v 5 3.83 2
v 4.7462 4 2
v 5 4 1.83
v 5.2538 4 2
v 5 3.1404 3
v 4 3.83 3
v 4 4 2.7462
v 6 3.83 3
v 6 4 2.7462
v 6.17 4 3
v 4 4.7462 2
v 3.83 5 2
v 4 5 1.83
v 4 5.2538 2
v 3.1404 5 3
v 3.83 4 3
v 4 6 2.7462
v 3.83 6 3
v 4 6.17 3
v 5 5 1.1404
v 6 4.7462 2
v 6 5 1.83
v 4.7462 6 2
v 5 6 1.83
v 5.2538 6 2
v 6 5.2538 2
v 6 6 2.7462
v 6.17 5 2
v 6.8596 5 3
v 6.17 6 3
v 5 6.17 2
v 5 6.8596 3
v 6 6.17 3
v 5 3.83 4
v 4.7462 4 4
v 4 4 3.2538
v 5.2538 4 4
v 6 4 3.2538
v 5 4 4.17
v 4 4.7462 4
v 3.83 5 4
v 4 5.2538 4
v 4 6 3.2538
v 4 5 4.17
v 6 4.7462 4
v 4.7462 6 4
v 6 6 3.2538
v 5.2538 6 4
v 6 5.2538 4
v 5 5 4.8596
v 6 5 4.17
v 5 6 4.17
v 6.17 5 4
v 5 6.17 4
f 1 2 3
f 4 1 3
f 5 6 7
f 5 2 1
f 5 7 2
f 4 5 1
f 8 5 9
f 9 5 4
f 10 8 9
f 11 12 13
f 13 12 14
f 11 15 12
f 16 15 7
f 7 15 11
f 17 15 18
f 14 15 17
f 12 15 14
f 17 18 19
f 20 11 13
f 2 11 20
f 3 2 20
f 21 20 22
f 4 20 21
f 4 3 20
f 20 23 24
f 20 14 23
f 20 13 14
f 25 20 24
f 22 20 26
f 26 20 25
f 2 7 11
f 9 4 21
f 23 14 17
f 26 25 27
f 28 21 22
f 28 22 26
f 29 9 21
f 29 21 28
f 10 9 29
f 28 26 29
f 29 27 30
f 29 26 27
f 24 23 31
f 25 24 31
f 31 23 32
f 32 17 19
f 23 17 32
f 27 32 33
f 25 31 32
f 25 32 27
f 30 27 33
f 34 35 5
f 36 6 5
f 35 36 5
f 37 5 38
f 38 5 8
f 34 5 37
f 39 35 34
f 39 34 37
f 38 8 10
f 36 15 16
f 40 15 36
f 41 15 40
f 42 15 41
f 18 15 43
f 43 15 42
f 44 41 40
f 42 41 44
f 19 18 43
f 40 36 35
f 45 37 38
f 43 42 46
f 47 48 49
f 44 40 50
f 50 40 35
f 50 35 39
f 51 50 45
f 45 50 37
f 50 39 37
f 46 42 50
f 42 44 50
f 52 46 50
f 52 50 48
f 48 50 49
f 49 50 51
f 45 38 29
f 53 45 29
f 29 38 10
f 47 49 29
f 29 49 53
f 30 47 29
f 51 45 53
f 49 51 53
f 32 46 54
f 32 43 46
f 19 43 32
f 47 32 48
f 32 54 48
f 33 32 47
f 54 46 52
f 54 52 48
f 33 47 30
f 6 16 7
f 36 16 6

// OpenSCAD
/*
TerrainTile.scad
Public Domain Code
Based on Metaballs By: William A Adams 	4 June 2011

This code is a simplified implementation of "Marching Cubes" over Noise + a Z gradient. A isosurface which is the interaction of the Noise field in tree octaves: half, one and four. All Cubes are tested and a joint hull is generated of each corner that lies inside the threshold  of the metaball 

*/

randseed=3798753;
Resolution =1; 
tileX=0;
tileY=0;
MinSubdivisions=3;//[0:1:5] 
Threshold = 0.0;// [0:0.01:1]
// Allways clamped to powers of two of resolution 
tilesize=16;//[1:1:64] 
// Small Medium Large
octavebalance=[40,150,280];
Zcutoff=5;
Zfalloff=0.1909;// [0:0.001:1]
Zoffset=3;
Diagnostic=false; 
colorseed=rands(0, 49709639, 1)[0]; 
DrawMetaballs( Threshold,tileX*f2(tilesize),tileY*f2(tilesize),-1,tilesize); 

/// end


module DrawMetaballs( Threshold,sx,sy,sz,sSize){
// clamp everyting to multiples and powers of resolution
x=f(sx);
y=f(sy);
    z=f(sz);
    Size=f2(sSize);
   // echo ( Threshold,x,y,z,Size);
DrawSubMetaballs( Threshold,x,y,z,Size); 
}
module DrawSubMetaballs( Threshold,x,y,z,Size,i=0) {    



suma = torus([-5,-5,-3]+[x,y,z],5,3) ; //Octavenoice (x, y, z);
sumb = torus([-5,-5,-3]+[x+ Size,y,z],5,3) ; //Octavenoice (x + Size, y, z );
sumc = torus([-5,-5,-3]+[x,y+ Size,z],5,3) ; //Octavenoice (x, y + Size, z);
sumd = torus([-5,-5,-3]+[x+ Size,y+ Size,z],5,3) ; //Octavenoice (x + Size, y + Size, z);

sume = torus([-5,-5,-3]+[x,y,z+ Size],5,3) ; //Octavenoice (x, y, z + Size);
sumf = torus([-5,-5,-3]+[x+ Size,y ,z+ Size], 5,3) ; //Octavenoice (x + Size, y, z + Size);
sumg = torus([-5,-5,-3]+[x,y+ Size,z+ Size], 5,3) ; //Octavenoice (x, y + Size, z + Size);
sumh = torus([-5,-5,-3]+[x+ Size,y+ Size,z+ Size], 5,3) ; //Octavenoice (x + Size, y + Size, z + Size);
sumcolor =[0.1,1,0]*0.3+0.7*[1-abs(Sweetnoise (x/5, y/5, z/5,colorseed+27)),1-abs(Sweetnoise (x/5, y/5, z/5,colorseed+13)),1-abs(Sweetnoise (x/5, y/5, z/5,colorseed))];

echo (suma);


// test for empty and full Cubes
 if (i<=MinSubdivisions&&z) { 
    h=Size*0.5  ;
    DrawSubMetaballs( Threshold,x,y,z,h,i+1);
    DrawSubMetaballs( Threshold,x+h,y,z,h,i+1);
    DrawSubMetaballs( Threshold,x,y+h,z,h,i+1);
    DrawSubMetaballs( Threshold,x+h,y+h,z,h,i+1);
    
    DrawSubMetaballs( Threshold,x,y,z+h,h,i+1);
    DrawSubMetaballs( Threshold,x+h,y,z+h,h,i+1);
    DrawSubMetaballs( Threshold,x,y+h,z+h,h,i+1);
    DrawSubMetaballs( Threshold,x+h,y+h,z+h,h,i+1);
    
    }else {
    
if (  suma >=  Threshold && sumb >=  Threshold && sumc >=  Threshold && sumd >=  Threshold && sume >=  Threshold && sumf >=  Threshold && sumg >=  Threshold && sumh >=  Threshold) {if (Diagnostic){translate([x, y, z]) %cube(Size);}} 
else if ( suma < Threshold && sumb < Threshold && sumc < Threshold && sumd < Threshold && sume < Threshold && sumf < Threshold && sumg < Threshold && sumh < Threshold) {
translate([x, y, z])  color(sumcolor) cube(Size);} 


else if(Size>Resolution){ 
    h=Size*0.5  ;
    DrawSubMetaballs( Threshold,x,y,z,h,i+1);
    DrawSubMetaballs( Threshold,x+h,y,z,h,i+1);
    DrawSubMetaballs( Threshold,x,y+h,z,h,i+1);
    DrawSubMetaballs( Threshold,x+h,y+h,z,h,i+1);
    
    DrawSubMetaballs( Threshold,x,y,z+h,h,i+1);
    DrawSubMetaballs( Threshold,x+h,y,z+h,h,i+1);
    DrawSubMetaballs( Threshold,x,y+h,z+h,h,i+1);
    DrawSubMetaballs( Threshold,x+h,y+h,z+h,h,i+1);}
else { 

    // For every corner inside treshold make and mirror a corner piece, hull the lot.
   //echo(sumcolor);
    color(sumcolor)hull(){
        
        sab=inter(suma,sumb,Threshold)*Size;
sac=inter(suma,sumc,Threshold)*Size;
sae=inter(suma,sume,Threshold)*Size;
sba=inter(sumb,suma,Threshold)*Size;
sbd=inter(sumb,sumd,Threshold)*Size;
sbf=inter(sumb,sumf,Threshold)*Size;
sca=inter(sumc,suma,Threshold)*Size;
scd=inter(sumc,sumd,Threshold)*Size;
scg=inter(sumc,sumg,Threshold)*Size;
sdb=inter(sumd,sumb,Threshold)*Size;
sdc=inter(sumd,sumc,Threshold)*Size;
sdh=inter(sumd,sumh,Threshold)*Size;
sea=inter(sume,suma,Threshold)*Size;
seg=inter(sume,sumg,Threshold)*Size;
sef=inter(sume,sumf,Threshold)*Size;
sfh=inter(sumf,sumh,Threshold)*Size;
sfe=inter(sumf,sume,Threshold)*Size;
sfb=inter(sumf,sumb,Threshold)*Size;
sge=inter(sumg,sume,Threshold)*Size;
sgh=inter(sumg,sumh,Threshold)*Size;
sgc=inter(sumg,sumc,Threshold)*Size;
shg=inter(sumh,sumg,Threshold)*Size;
shf=inter(sumh,sumf,Threshold)*Size;
shd=inter(sumh,sumd,Threshold)*Size;
if (suma < Threshold){    translate([x, y, z])  Corner(sab,sac,sae);}
if (sumb < Threshold){    translate([x + Size, y, z])  Corner(-sba,sbd,sbf);}
if (sumc < Threshold){  translate([x, y + Size, z])  Corner(scd,-sca,scg);}
if (sumd < Threshold){    translate([x + Size, y + Size, z]) Corner(-sdc,-sdb,sdh);}
    
if (sume < Threshold){   translate([x, y, z + Size])  Corner(sef,seg,-sea);}
if (sumf < Threshold){   translate([x + Size, y, z + Size])  Corner(-sfe,sfh,-sfb);}
if (sumg < Threshold){    translate([x, y + Size, z + Size])  Corner(sgh,-sge,-sgc);}
if (sumh < Threshold){    translate([x + Size, y + Size, z + Size]) Corner(-shg,-shf,-shd);}
}
    }
}}


//Corner piece
module Corner(u=0.5,v=0.5,w=0.5) {scale([u,v,w])
polyhedron
    (points = [	       [0,0,0],[1,0,0],[0,1,0],[0,0,1],],      faces = [		  [0,0,1],[0,0,2],[0,0,3],[1,2,3]
		  ]
     );}
     
     function lim31(l, v) = v / len3(v) * l;
function addl(l, c = 0) = c < len(l) - 1 ? l[c] + addl(l, c + 1) : l[
 c];
function len3(v) = len(v) > 1 ? sqrt(addl([
 for (i = [0: len(v) - 1]) pow(v[i], 2)
])) : len(v) == 1 ? v[0] : v;
// Random color

function Lotto(i) = [rands(i*30,i*30+ 30, 1)[0],rands(0, 65, 1)[0],rands(0, 75, 1)[0],rands(21, 24, 1)[0]];

//Field function
     function ColorField3D(x, y, z, BallSack,Colorsack, i) = (i == 0) ? Powercolor(x, y, z, BallSack[0])*Colorsack[0]: Powercolor(x, y, z, BallSack[i])*Colorsack[i] + ColorField3D(x, y, z, BallSack,Colorsack, i - 1);

function Powercolor(x, y, z, Ball) = (Ball[3] / sqrt((x - Ball[0]) * (x - Ball[0]) + (y - Ball[1]) * (y - Ball[1]) + (z - Ball[2]) * (z - Ball[2]))); 
     
//function Powerball(x, y, z, Ball) = (Ball[3] / sqrt((x - Ball[0]) * (x - Ball[0]) + (y - Ball[1]) * (y - Ball[1]) + (z - Ball[2]) * (z - Ball[2])));
 function Powerball(x, y, z, Ball)   = Coldnoise (x,y,z);
// Recursive Field Evaluation
function BallField3D(x, y, z, BallSack, i) = (i == 0) ? Powerball(x, y, z, BallSack[0]): Powerball(x, y, z, BallSack[i]) + BallField3D(x, y, z, BallSack, i - 1);
function rndc() = [round(rands(0, 2, 1)[0])/2, round(rands(0, 2, 1)[0])/2, round(rands(0, 2, 1)[0])/2];
     //interpolate
function inter(t,r,Threshold)=(t==r)?1:(t>Threshold)?(r<Threshold)? abs(Threshold-t)/abs(t-r) :0 :(r>Threshold)? abs(Threshold-t)/abs(t-r) :1 ;
// Recursive find min/max extremes
function findMax(v, select, i = 0) = ((i + 1) < len(v)) ? max(v[i][select] + abs(v[i][3]) + Resolution, findMax(v, select, i + 1)): v[i][select] + abs(v[i][3]) + Resolution;
function findMin(v, select, i = 0) = ((i + 1) < len(v)) ? min(v[i][select] - abs(v[i][3]) - Resolution, findMin(v, select, i + 1)): v[i][select] - abs(v[i][3]) - Resolution;
function Coldnoise (x,y,z,seed=69940 )= 
((3754853343/((abs((floor(x+40)) ))+1))%1
+(3628273133/((abs((floor(y+44) ) ))+1) )%1
+(3500450271/((abs((floor(z+46 )) ))+1) )%1
+(3367900313/(abs(seed)+1) )/1)%1 ;

function Sweetnoise (x,y,z,seed=69840)=(z-Zoffset)*Zfalloff+tril( SC3(x-floor(x)), (SC3(y-floor(y))), (SC3(z-floor(z))),
    Coldnoise ((x ) ,(y ) ,(z ) ,seed),
    Coldnoise ((x+1  ),(y ) ,(z ) ,seed),
    Coldnoise ((x ) ,(y+1 ) ,(z ) ,seed),
    Coldnoise ((x ) ,(y ) ,(z+1) ,seed),
    Coldnoise ((x  +1),(y ) ,(z+1 ) ,seed),
    Coldnoise ((x ) ,(y+1 ) ,(z+1 ) ,seed),
    Coldnoise ((x+1 ),(y+1) ,(z ) ,seed),
    Coldnoise ((x +1) ,(y+1),(z+1 ) ,seed));
    
   function SC3 (a)= (a * a * (3 - 2 * a))
   ;
function tril(x,y,z,V000,V100,V010,V001,V101,V011,V110,V111) =	
/*V111* (1 - x)* (1 - y)* (1 - z) +
V011* x *(1 - y) *(1 - z) + 
V101* (1 - x) *y *(1 - z) + 
V110* (1 - x) *(1 - y)* z +
V010* x *(1 - y)* z + 
V100* (1 - x)* y *z + 
V001* x *y* (1 - z) + 
V000* x *y *z
*/
V000*  (1 - x)* (1 - y)* (1 - z) +
V100*  x *(1 - y) *(1 - z) + 
V010*  (1 - x) *y *(1 - z) + 
V001*  (1 - x) *(1 - y)* z +
V101*  x *(1 - y)* z + 
V011*  (1 - x)* y *z + 
V110*  x *y* (1 - z) + 
V111*  x *y *z

;
function Octavenoice(x, y, z,seed=randseed) =let(SML=lim31(1,octavebalance))(Sweetnoise (x*1, y*1, z*1,seed)*SML[0]+Sweetnoise (x/2, y/2, z/2,seed)*SML[1]+  Sweetnoise (x/4, y/4, z/4,seed)*SML[2]);
function f(a)= floor(a/Resolution)*Resolution;
function f2(a)= pow(2, round(log(a/(Resolution))/log(2)))*Resolution;

function torus(p, tx = 2.9, ty = 0.61) =
let (q = [len3([p.x, p.z]) - tx, p.y]) chamfered_filleted_block_eval(p,[5,5,5],2,1);//(len3(q) - ty);

function un(v) = v / max(len3(v), 0.000001) * 1; // div by zero safe unit normal
function dot(v1, v2) = v1[0] * v2[0] + v1[1] * v2[1] + v1[2] * v2[2];
function v3(p) = [p.x, p.y, p.z]; // vec3 formatter
function abs3(v) = [abs(v[0]), abs(v[1]),
 abs(v[2])
];

function max3(a, b) = [max(a[0], b),
 max(a[1], b), max(a[2], b)
];

function mima3(a, b, c) = [min(max(a[0], b[0]), c[0]),
 min(max(a[1], b[1]), c[1]), min(max(a[2], b[2]), c[2])
];


function chamfered_filleted_block_eval(p, size, ch, r) =
let (M = [
 [1, 0, 0],
 [0, 1, 0],
 [0, 0, 1], // box bounds
 [1, 1, 0] / sqrt(2), [0, 1, 1] / sqrt(2), [1, 0, 1] / sqrt(2), // edge chamfer bounds
 [1, 1, 1] / sqrt(3)
 ], // vertex chamfer bounds, 
 cr = (ch - sqrt(2) * r / tan(67.5)) / sqrt(2), d = _abs(p) - size /
 2 + [r,
 r, r
 ]) - (r // offset
 - max(M * d + [0, 0, 0, cr, cr, cr,
 cr * sqrt(3)
 ]) // distance inside scene
 - norm(clampMin(M * d + [0, 0, 0, cr,
 cr, cr, cr * sqrt(3)
 ], 0))); // distance outside scene

function clampMin(v, lim) = [
 for (vi = v) max(vi, lim)
];

function _abs(v) = [
 for (vi = v) abs(vi)
];
